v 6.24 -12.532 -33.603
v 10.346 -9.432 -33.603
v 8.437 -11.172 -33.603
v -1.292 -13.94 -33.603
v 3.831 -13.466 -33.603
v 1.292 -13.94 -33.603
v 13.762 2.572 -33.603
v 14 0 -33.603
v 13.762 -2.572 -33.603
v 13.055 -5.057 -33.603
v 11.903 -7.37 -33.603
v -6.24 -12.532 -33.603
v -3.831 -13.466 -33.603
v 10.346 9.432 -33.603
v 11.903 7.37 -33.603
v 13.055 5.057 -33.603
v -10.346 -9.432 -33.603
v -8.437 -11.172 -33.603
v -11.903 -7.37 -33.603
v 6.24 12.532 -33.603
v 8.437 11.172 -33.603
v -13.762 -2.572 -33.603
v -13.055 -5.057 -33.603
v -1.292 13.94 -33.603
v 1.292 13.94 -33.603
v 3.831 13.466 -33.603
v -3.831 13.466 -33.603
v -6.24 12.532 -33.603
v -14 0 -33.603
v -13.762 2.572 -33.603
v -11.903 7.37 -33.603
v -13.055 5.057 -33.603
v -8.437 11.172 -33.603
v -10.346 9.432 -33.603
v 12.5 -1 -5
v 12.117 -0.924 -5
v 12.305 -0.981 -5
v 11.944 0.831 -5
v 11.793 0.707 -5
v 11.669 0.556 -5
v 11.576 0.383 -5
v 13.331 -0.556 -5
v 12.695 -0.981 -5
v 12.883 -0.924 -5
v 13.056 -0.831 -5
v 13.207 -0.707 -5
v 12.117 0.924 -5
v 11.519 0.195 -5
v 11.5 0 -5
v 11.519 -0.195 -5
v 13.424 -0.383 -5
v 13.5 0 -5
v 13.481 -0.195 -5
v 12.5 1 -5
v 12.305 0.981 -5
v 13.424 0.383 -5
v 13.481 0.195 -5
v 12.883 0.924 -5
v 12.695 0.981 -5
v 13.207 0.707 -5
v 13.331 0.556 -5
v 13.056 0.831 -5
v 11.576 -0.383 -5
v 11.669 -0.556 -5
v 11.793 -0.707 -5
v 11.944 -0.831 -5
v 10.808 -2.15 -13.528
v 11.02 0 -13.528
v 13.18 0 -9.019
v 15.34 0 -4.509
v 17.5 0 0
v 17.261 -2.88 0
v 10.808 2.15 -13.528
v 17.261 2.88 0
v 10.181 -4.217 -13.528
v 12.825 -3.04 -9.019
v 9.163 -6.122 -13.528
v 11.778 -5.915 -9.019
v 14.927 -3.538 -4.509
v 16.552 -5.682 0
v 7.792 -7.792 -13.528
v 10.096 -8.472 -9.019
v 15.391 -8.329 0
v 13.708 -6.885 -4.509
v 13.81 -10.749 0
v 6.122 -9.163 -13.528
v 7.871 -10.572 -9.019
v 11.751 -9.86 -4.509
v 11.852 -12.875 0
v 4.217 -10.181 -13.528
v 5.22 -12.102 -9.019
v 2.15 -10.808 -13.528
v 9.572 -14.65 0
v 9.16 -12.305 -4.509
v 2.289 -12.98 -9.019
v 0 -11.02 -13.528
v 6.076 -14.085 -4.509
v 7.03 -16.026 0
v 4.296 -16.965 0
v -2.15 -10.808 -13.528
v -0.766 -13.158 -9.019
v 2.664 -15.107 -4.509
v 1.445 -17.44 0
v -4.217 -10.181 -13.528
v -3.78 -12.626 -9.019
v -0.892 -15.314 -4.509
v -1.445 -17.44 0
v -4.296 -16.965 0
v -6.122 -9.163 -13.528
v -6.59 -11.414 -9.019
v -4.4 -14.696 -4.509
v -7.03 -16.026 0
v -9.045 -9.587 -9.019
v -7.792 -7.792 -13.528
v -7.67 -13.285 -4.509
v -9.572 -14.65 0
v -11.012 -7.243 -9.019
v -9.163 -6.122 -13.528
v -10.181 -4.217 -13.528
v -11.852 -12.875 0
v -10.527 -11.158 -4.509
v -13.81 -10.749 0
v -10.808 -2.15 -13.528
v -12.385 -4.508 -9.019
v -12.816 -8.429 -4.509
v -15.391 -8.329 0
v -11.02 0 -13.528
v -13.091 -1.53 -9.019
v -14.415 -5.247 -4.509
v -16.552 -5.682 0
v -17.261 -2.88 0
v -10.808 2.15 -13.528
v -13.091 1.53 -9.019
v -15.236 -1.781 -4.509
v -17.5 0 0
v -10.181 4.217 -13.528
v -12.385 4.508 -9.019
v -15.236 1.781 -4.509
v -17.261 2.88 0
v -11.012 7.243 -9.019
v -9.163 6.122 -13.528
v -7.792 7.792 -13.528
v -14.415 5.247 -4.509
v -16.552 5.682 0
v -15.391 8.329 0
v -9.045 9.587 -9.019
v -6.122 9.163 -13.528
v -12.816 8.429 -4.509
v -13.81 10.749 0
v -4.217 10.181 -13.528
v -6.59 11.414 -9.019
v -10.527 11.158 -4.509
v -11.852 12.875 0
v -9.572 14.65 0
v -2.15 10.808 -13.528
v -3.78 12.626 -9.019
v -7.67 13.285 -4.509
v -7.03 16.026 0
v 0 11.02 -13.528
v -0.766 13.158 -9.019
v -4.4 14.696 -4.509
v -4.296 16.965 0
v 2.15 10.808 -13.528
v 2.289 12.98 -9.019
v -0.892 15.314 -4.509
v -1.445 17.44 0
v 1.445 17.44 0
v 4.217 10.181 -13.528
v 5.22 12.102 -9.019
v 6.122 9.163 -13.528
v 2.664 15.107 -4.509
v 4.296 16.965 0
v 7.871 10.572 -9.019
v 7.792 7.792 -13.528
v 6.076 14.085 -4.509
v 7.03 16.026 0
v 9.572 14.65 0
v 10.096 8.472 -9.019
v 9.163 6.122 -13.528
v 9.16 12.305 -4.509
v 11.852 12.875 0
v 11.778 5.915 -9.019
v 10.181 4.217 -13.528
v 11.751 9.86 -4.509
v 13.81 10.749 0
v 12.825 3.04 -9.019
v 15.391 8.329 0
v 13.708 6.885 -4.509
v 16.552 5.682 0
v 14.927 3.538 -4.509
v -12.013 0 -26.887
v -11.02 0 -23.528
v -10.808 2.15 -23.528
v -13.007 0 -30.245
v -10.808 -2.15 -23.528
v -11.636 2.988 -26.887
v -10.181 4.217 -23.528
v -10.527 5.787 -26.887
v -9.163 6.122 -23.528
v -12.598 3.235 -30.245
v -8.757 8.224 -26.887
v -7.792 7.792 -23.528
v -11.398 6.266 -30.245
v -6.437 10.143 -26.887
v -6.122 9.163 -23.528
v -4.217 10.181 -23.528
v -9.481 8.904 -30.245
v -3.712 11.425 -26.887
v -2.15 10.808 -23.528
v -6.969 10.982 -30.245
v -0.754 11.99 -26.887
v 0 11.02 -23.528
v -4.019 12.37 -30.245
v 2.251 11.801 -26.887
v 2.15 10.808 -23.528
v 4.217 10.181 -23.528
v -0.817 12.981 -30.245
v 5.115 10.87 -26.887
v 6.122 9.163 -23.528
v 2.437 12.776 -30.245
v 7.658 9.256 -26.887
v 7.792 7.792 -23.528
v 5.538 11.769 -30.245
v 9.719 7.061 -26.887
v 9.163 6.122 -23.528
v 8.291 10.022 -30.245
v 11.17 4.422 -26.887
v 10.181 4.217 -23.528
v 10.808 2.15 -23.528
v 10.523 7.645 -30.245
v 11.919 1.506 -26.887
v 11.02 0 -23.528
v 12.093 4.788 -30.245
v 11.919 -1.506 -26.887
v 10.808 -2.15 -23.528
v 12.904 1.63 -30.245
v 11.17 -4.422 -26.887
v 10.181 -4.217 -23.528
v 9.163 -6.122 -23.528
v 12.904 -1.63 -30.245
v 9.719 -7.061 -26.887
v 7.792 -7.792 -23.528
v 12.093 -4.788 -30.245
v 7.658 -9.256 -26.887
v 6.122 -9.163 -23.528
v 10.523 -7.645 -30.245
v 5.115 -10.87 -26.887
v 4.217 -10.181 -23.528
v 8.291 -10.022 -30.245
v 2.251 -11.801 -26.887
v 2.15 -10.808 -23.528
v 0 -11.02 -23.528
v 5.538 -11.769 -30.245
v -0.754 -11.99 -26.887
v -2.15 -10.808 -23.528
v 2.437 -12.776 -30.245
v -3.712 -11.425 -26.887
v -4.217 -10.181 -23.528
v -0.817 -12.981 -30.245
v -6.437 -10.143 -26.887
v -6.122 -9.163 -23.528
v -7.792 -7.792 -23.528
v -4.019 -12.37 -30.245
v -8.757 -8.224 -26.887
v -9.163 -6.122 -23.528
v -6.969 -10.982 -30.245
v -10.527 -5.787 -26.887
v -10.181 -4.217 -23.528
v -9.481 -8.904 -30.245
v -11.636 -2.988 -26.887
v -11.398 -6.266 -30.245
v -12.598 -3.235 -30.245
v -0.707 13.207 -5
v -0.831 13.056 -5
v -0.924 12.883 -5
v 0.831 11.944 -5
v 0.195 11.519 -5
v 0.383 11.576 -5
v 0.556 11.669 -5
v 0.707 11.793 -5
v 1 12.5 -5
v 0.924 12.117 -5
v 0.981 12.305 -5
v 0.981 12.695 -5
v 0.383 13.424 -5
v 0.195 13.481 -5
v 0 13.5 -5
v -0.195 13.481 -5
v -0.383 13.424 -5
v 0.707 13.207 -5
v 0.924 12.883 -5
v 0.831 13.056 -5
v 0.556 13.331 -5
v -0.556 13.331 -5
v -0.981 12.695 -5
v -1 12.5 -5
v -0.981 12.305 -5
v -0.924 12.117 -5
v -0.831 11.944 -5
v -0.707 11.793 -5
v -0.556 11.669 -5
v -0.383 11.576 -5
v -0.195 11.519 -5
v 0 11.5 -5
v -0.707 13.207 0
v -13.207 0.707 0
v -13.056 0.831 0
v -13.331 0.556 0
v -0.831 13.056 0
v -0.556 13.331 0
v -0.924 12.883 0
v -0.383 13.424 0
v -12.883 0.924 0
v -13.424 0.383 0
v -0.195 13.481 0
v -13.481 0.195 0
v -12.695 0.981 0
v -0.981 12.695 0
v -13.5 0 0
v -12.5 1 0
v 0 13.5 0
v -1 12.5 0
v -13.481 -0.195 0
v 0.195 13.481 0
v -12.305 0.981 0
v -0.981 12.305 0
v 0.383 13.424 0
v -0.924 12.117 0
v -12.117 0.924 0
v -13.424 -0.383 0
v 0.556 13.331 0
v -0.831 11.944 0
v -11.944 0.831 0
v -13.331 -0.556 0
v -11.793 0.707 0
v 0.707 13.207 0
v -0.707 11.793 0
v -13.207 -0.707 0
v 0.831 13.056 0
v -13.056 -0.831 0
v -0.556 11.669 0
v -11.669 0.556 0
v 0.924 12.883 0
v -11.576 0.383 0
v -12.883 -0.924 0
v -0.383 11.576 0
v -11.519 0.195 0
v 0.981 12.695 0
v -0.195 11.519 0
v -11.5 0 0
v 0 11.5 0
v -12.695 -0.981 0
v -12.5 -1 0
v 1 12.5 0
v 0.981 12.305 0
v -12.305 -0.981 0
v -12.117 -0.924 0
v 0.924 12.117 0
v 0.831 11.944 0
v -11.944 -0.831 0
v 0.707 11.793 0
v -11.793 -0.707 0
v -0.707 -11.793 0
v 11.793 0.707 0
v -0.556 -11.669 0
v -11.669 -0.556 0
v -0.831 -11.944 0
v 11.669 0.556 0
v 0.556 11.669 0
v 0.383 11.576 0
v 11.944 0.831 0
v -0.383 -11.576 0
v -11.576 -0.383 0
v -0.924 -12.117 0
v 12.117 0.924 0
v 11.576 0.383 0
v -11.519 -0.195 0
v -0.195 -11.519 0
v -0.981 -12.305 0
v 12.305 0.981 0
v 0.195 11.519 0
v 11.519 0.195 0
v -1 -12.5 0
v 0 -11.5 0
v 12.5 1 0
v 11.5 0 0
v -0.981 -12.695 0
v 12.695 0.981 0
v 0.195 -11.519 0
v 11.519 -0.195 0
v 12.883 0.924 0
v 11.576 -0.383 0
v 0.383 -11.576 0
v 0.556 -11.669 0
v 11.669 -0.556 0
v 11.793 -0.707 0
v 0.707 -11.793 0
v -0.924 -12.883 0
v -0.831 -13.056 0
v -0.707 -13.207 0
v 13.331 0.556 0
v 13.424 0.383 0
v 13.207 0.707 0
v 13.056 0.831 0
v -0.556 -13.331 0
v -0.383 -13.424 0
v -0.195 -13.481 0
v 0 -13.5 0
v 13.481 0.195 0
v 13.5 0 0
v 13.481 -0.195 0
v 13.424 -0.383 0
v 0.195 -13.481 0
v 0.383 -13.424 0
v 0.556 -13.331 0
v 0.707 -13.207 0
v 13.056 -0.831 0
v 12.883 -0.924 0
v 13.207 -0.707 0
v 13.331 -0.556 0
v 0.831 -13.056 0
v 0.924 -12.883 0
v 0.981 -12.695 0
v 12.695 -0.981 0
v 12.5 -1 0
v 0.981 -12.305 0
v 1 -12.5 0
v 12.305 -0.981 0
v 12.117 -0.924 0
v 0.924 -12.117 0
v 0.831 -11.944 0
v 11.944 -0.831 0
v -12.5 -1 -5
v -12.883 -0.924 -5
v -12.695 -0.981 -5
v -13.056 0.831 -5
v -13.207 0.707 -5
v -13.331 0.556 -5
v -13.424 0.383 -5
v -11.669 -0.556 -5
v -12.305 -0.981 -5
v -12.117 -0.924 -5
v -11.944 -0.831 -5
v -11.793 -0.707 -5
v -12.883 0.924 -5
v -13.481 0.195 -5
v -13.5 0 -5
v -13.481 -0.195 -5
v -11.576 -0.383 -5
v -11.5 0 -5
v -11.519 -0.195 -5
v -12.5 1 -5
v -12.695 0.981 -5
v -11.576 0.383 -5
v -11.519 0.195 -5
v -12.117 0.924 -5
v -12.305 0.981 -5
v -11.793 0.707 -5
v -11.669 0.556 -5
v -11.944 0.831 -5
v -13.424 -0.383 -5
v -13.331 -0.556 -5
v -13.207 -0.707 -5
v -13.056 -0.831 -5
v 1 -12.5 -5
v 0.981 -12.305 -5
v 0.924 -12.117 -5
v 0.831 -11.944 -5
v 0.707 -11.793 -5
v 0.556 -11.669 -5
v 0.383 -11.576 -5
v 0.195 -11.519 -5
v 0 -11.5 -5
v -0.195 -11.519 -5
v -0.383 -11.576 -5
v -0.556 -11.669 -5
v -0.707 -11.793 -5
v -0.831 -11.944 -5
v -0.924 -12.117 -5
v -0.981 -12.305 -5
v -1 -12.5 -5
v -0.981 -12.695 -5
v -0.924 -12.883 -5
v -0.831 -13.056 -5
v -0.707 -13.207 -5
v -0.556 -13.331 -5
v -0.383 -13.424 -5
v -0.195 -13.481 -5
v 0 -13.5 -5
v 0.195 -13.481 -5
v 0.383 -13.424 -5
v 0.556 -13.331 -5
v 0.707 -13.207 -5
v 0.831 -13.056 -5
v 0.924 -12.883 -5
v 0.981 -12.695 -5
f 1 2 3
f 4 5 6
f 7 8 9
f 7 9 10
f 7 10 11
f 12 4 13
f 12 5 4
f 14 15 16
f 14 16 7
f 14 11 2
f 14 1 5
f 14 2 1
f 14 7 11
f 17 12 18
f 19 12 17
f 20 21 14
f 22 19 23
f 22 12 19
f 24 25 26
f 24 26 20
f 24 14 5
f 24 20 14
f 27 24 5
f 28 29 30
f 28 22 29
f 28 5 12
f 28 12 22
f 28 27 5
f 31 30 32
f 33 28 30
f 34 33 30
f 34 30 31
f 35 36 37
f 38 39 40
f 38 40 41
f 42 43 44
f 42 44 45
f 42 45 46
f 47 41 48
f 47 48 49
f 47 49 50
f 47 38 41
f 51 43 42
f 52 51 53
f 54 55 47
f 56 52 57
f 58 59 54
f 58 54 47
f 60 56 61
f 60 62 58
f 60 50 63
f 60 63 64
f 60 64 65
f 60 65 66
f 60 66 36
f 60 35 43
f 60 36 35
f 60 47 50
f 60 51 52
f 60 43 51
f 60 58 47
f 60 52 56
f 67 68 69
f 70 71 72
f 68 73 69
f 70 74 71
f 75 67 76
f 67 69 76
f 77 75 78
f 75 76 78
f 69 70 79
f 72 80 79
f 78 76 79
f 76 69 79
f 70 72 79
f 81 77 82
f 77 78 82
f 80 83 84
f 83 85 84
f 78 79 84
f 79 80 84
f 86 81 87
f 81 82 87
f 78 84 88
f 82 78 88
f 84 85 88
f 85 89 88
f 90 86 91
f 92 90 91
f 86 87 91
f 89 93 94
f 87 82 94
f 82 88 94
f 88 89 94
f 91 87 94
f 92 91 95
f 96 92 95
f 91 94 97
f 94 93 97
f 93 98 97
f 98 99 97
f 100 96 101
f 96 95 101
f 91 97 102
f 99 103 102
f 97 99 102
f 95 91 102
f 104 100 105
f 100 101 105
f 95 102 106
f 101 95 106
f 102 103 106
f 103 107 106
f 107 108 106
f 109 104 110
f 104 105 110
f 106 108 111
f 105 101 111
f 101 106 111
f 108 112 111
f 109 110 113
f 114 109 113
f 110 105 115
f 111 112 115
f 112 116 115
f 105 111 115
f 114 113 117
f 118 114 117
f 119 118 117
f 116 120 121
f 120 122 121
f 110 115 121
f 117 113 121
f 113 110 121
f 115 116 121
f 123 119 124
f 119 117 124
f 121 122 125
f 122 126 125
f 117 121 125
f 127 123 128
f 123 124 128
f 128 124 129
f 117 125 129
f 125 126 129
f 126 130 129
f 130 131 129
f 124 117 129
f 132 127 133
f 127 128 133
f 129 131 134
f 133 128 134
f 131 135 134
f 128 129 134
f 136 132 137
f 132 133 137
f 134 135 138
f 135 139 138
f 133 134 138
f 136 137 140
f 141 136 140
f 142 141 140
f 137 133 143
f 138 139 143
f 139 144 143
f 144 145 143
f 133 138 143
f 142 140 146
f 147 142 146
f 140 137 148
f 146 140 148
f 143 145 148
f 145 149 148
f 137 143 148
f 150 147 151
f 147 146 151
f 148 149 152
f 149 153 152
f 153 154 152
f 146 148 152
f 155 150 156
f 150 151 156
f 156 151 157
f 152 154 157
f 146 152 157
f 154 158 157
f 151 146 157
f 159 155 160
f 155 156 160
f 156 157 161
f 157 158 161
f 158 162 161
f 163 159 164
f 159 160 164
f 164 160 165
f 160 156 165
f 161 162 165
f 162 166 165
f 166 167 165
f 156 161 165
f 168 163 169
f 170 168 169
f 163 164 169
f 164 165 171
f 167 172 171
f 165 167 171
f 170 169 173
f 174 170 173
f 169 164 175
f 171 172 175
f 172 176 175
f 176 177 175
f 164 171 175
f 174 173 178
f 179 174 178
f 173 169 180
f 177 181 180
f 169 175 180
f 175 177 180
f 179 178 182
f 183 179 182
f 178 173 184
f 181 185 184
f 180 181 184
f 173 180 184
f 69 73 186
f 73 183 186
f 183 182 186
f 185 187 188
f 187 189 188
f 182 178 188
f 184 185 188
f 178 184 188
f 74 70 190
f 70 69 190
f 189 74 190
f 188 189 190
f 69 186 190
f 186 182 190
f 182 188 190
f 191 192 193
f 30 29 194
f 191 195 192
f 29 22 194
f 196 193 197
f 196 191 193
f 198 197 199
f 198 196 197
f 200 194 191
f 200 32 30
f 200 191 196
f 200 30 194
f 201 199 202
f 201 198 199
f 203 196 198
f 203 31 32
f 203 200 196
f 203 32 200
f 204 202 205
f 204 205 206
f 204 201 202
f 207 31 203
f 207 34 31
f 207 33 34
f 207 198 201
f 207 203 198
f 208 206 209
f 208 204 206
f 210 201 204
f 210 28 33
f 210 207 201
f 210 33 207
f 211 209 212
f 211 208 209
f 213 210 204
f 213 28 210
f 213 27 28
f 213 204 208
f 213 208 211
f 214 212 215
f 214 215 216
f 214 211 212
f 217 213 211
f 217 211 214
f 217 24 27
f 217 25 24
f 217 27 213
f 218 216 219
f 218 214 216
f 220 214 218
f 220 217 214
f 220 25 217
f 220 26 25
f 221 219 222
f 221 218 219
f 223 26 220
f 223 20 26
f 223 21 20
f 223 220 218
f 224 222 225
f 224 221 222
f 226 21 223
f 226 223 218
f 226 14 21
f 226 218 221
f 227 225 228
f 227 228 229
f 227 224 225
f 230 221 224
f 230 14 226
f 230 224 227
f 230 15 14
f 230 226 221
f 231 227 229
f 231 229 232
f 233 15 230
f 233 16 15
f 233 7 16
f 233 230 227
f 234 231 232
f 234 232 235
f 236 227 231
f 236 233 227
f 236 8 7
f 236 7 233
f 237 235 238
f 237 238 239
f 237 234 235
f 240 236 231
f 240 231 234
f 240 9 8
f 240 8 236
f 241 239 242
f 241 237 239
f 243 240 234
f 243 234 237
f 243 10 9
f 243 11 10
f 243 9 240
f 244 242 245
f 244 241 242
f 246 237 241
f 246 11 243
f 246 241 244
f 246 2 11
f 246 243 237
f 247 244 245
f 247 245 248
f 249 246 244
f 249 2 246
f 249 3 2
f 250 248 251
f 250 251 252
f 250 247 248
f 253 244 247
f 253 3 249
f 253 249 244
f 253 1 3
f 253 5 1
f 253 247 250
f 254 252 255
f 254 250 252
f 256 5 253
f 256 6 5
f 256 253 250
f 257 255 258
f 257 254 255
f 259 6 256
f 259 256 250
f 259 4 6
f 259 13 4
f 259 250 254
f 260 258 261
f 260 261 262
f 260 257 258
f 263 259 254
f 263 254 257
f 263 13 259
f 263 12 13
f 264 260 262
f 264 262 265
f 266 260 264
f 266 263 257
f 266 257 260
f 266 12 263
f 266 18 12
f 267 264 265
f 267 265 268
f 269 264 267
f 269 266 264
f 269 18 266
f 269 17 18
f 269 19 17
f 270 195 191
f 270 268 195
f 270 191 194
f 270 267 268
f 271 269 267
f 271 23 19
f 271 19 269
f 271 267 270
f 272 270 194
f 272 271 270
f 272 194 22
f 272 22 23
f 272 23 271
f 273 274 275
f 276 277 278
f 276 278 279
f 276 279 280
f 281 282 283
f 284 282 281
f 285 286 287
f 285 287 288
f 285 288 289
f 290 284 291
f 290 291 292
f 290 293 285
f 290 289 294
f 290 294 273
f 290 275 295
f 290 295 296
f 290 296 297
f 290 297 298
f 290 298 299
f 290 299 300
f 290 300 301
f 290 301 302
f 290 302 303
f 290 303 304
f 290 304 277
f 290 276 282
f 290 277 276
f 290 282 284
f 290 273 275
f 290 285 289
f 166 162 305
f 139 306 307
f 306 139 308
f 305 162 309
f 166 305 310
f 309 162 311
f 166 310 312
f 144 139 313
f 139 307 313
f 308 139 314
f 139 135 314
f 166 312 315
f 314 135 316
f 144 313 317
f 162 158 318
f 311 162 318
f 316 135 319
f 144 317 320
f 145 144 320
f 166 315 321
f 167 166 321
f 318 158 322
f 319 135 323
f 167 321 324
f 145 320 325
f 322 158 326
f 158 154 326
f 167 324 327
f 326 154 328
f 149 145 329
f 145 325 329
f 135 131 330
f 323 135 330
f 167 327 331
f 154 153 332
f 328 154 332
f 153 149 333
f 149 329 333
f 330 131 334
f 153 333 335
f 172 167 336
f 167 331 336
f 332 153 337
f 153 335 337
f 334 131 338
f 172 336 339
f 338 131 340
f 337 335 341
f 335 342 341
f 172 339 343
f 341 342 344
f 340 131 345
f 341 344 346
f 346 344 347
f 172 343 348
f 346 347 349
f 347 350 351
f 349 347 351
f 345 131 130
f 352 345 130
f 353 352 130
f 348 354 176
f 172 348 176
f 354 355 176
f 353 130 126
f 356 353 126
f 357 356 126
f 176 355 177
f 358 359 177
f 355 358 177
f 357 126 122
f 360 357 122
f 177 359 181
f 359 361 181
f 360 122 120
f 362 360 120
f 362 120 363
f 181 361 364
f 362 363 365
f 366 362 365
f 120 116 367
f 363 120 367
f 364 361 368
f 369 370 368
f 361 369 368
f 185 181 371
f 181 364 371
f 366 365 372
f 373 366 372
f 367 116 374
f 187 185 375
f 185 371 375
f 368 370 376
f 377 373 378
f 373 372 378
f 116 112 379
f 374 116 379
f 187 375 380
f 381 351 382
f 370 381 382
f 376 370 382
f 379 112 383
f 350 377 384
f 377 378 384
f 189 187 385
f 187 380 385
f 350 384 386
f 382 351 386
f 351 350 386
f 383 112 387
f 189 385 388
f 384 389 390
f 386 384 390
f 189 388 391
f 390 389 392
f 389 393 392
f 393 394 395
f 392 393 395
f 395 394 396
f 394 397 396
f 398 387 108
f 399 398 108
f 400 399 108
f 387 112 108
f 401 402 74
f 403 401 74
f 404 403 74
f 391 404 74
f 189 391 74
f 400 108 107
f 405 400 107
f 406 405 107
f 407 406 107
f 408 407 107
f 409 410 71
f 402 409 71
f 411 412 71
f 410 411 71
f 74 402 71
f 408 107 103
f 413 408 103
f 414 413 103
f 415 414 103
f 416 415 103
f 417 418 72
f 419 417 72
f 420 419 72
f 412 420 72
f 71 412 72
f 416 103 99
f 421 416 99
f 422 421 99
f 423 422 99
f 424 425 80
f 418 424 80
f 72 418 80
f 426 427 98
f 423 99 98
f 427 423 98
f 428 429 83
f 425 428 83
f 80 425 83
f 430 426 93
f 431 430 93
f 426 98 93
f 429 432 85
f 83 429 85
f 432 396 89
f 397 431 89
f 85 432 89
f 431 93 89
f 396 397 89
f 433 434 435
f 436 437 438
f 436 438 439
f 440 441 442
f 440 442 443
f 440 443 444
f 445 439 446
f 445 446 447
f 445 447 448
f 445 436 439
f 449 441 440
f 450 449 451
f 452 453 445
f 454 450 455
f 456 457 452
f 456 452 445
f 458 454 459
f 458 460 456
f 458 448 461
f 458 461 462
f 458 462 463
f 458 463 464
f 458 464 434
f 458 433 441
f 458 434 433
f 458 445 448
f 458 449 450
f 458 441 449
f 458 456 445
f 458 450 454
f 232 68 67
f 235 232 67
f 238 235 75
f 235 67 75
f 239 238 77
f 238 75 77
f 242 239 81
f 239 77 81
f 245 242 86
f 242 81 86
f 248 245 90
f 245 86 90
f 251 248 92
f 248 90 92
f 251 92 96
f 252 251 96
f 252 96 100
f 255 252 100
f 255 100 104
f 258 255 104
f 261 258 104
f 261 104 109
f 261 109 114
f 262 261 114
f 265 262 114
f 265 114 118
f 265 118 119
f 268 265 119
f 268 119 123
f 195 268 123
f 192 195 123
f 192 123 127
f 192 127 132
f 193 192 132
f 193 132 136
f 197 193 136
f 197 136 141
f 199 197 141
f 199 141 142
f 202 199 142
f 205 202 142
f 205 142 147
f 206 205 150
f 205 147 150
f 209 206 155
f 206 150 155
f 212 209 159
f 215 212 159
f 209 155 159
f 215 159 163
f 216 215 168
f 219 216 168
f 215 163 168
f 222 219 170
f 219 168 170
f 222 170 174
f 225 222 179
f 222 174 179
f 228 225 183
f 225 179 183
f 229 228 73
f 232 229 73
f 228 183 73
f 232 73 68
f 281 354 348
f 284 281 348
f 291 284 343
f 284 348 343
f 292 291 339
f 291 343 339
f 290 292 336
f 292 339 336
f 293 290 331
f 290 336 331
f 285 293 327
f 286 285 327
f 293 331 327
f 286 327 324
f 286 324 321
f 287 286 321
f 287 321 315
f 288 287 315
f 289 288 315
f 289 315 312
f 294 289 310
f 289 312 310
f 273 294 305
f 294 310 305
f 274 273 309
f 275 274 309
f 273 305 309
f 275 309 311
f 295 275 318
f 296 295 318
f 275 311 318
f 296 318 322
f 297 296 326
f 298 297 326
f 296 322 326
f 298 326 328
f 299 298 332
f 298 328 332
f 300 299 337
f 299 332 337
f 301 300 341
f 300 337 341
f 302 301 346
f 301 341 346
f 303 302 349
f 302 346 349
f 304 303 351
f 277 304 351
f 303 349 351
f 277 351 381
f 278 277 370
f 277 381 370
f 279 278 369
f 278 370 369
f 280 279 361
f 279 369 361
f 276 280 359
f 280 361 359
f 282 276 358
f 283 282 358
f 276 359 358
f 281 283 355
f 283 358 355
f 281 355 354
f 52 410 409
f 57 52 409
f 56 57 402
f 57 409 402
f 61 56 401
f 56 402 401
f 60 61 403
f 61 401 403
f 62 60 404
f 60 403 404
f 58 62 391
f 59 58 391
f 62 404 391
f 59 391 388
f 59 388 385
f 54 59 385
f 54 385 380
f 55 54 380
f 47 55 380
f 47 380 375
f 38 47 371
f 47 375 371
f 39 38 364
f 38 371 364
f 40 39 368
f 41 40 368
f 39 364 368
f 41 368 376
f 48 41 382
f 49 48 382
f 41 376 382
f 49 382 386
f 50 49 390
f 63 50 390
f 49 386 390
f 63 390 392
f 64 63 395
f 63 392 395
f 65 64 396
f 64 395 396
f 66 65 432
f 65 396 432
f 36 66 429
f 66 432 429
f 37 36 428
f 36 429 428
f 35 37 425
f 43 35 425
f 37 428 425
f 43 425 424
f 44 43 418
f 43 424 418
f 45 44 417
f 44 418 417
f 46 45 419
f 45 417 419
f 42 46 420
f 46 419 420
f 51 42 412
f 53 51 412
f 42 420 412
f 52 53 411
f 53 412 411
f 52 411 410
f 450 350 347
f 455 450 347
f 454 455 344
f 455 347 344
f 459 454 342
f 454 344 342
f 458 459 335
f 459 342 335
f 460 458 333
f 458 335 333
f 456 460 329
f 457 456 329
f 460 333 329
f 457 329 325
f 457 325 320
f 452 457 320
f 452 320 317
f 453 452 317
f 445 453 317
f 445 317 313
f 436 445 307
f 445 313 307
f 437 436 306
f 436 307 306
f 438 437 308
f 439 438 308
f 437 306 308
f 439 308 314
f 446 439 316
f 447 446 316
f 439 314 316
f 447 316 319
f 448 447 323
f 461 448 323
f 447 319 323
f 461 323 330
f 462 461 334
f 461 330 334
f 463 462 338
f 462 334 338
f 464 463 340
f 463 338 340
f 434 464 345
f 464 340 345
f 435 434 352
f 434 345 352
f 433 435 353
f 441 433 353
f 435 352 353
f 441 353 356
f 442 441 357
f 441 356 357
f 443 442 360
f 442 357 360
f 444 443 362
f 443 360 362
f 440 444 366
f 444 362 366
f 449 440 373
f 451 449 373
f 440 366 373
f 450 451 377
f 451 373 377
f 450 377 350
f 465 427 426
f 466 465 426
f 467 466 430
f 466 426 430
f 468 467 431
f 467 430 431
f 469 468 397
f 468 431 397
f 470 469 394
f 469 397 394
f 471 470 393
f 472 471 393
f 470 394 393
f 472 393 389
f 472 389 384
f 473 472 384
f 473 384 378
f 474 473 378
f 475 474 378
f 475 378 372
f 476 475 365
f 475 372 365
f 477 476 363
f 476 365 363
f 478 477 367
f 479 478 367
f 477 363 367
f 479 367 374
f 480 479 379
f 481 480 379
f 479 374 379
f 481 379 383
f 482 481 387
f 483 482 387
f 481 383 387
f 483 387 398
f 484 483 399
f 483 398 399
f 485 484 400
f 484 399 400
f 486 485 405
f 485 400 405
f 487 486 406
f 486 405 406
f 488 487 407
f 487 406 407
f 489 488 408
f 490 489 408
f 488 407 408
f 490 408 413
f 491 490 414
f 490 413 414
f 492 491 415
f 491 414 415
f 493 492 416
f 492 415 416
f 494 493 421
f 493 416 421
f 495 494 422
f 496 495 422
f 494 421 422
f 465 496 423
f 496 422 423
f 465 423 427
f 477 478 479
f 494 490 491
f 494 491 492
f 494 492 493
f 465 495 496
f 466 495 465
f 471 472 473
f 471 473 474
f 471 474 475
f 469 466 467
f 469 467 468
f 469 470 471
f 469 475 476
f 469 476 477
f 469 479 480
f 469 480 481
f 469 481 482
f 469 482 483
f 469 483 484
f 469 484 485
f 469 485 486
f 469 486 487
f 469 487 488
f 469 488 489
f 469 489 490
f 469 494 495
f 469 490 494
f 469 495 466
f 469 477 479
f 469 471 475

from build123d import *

# Parameters (mm, degrees)
F2_R     = 1
F3_DEPTH = 5
F4_R     = 11.019991
F5_DEPTH = 10


with BuildPart() as f1:
    # F0 (on Front) → F1 (revolve)
    with BuildSketch(Plane.XZ):
        Polygon((17.5, 0), (0, 0), (0, -13.5281), (11.019991, -13.5281), align=None)
    revolve(axis=Axis((0, 0, -6.76405), (0, 0, -1)))

    # F2 (on face) → F3 (cut)
    with BuildSketch(Plane.XY):
        with Locations((0, 12.5)):
            Circle(F2_R)
        with Locations((-12.5, 0)):
            Circle(F2_R)
        with Locations((12.5, 0)):
            Circle(F2_R)
        with Locations((0, -12.5)):
            Circle(F2_R)
    extrude(amount=-F3_DEPTH, mode=Mode.SUBTRACT)

    # F4 (on face) → F5 (join)
    with BuildSketch(Plane(origin=(0, 0, -13.5281), x_dir=(1, 0, 0), z_dir=(0, 0, -1))):
        Circle(F4_R)
    extrude(amount=F5_DEPTH)

    # F6 (on Front) → F7 (revolve)
    with BuildSketch(Plane.XZ):
        Polygon((0, -23.5281), (-11.019991, -23.5281), (-14, -33.603374), (0, -33.603374), align=None)
    revolve(axis=Axis((0, 0, -28.565737), (0, 0, -1)))


solid = f1.part
